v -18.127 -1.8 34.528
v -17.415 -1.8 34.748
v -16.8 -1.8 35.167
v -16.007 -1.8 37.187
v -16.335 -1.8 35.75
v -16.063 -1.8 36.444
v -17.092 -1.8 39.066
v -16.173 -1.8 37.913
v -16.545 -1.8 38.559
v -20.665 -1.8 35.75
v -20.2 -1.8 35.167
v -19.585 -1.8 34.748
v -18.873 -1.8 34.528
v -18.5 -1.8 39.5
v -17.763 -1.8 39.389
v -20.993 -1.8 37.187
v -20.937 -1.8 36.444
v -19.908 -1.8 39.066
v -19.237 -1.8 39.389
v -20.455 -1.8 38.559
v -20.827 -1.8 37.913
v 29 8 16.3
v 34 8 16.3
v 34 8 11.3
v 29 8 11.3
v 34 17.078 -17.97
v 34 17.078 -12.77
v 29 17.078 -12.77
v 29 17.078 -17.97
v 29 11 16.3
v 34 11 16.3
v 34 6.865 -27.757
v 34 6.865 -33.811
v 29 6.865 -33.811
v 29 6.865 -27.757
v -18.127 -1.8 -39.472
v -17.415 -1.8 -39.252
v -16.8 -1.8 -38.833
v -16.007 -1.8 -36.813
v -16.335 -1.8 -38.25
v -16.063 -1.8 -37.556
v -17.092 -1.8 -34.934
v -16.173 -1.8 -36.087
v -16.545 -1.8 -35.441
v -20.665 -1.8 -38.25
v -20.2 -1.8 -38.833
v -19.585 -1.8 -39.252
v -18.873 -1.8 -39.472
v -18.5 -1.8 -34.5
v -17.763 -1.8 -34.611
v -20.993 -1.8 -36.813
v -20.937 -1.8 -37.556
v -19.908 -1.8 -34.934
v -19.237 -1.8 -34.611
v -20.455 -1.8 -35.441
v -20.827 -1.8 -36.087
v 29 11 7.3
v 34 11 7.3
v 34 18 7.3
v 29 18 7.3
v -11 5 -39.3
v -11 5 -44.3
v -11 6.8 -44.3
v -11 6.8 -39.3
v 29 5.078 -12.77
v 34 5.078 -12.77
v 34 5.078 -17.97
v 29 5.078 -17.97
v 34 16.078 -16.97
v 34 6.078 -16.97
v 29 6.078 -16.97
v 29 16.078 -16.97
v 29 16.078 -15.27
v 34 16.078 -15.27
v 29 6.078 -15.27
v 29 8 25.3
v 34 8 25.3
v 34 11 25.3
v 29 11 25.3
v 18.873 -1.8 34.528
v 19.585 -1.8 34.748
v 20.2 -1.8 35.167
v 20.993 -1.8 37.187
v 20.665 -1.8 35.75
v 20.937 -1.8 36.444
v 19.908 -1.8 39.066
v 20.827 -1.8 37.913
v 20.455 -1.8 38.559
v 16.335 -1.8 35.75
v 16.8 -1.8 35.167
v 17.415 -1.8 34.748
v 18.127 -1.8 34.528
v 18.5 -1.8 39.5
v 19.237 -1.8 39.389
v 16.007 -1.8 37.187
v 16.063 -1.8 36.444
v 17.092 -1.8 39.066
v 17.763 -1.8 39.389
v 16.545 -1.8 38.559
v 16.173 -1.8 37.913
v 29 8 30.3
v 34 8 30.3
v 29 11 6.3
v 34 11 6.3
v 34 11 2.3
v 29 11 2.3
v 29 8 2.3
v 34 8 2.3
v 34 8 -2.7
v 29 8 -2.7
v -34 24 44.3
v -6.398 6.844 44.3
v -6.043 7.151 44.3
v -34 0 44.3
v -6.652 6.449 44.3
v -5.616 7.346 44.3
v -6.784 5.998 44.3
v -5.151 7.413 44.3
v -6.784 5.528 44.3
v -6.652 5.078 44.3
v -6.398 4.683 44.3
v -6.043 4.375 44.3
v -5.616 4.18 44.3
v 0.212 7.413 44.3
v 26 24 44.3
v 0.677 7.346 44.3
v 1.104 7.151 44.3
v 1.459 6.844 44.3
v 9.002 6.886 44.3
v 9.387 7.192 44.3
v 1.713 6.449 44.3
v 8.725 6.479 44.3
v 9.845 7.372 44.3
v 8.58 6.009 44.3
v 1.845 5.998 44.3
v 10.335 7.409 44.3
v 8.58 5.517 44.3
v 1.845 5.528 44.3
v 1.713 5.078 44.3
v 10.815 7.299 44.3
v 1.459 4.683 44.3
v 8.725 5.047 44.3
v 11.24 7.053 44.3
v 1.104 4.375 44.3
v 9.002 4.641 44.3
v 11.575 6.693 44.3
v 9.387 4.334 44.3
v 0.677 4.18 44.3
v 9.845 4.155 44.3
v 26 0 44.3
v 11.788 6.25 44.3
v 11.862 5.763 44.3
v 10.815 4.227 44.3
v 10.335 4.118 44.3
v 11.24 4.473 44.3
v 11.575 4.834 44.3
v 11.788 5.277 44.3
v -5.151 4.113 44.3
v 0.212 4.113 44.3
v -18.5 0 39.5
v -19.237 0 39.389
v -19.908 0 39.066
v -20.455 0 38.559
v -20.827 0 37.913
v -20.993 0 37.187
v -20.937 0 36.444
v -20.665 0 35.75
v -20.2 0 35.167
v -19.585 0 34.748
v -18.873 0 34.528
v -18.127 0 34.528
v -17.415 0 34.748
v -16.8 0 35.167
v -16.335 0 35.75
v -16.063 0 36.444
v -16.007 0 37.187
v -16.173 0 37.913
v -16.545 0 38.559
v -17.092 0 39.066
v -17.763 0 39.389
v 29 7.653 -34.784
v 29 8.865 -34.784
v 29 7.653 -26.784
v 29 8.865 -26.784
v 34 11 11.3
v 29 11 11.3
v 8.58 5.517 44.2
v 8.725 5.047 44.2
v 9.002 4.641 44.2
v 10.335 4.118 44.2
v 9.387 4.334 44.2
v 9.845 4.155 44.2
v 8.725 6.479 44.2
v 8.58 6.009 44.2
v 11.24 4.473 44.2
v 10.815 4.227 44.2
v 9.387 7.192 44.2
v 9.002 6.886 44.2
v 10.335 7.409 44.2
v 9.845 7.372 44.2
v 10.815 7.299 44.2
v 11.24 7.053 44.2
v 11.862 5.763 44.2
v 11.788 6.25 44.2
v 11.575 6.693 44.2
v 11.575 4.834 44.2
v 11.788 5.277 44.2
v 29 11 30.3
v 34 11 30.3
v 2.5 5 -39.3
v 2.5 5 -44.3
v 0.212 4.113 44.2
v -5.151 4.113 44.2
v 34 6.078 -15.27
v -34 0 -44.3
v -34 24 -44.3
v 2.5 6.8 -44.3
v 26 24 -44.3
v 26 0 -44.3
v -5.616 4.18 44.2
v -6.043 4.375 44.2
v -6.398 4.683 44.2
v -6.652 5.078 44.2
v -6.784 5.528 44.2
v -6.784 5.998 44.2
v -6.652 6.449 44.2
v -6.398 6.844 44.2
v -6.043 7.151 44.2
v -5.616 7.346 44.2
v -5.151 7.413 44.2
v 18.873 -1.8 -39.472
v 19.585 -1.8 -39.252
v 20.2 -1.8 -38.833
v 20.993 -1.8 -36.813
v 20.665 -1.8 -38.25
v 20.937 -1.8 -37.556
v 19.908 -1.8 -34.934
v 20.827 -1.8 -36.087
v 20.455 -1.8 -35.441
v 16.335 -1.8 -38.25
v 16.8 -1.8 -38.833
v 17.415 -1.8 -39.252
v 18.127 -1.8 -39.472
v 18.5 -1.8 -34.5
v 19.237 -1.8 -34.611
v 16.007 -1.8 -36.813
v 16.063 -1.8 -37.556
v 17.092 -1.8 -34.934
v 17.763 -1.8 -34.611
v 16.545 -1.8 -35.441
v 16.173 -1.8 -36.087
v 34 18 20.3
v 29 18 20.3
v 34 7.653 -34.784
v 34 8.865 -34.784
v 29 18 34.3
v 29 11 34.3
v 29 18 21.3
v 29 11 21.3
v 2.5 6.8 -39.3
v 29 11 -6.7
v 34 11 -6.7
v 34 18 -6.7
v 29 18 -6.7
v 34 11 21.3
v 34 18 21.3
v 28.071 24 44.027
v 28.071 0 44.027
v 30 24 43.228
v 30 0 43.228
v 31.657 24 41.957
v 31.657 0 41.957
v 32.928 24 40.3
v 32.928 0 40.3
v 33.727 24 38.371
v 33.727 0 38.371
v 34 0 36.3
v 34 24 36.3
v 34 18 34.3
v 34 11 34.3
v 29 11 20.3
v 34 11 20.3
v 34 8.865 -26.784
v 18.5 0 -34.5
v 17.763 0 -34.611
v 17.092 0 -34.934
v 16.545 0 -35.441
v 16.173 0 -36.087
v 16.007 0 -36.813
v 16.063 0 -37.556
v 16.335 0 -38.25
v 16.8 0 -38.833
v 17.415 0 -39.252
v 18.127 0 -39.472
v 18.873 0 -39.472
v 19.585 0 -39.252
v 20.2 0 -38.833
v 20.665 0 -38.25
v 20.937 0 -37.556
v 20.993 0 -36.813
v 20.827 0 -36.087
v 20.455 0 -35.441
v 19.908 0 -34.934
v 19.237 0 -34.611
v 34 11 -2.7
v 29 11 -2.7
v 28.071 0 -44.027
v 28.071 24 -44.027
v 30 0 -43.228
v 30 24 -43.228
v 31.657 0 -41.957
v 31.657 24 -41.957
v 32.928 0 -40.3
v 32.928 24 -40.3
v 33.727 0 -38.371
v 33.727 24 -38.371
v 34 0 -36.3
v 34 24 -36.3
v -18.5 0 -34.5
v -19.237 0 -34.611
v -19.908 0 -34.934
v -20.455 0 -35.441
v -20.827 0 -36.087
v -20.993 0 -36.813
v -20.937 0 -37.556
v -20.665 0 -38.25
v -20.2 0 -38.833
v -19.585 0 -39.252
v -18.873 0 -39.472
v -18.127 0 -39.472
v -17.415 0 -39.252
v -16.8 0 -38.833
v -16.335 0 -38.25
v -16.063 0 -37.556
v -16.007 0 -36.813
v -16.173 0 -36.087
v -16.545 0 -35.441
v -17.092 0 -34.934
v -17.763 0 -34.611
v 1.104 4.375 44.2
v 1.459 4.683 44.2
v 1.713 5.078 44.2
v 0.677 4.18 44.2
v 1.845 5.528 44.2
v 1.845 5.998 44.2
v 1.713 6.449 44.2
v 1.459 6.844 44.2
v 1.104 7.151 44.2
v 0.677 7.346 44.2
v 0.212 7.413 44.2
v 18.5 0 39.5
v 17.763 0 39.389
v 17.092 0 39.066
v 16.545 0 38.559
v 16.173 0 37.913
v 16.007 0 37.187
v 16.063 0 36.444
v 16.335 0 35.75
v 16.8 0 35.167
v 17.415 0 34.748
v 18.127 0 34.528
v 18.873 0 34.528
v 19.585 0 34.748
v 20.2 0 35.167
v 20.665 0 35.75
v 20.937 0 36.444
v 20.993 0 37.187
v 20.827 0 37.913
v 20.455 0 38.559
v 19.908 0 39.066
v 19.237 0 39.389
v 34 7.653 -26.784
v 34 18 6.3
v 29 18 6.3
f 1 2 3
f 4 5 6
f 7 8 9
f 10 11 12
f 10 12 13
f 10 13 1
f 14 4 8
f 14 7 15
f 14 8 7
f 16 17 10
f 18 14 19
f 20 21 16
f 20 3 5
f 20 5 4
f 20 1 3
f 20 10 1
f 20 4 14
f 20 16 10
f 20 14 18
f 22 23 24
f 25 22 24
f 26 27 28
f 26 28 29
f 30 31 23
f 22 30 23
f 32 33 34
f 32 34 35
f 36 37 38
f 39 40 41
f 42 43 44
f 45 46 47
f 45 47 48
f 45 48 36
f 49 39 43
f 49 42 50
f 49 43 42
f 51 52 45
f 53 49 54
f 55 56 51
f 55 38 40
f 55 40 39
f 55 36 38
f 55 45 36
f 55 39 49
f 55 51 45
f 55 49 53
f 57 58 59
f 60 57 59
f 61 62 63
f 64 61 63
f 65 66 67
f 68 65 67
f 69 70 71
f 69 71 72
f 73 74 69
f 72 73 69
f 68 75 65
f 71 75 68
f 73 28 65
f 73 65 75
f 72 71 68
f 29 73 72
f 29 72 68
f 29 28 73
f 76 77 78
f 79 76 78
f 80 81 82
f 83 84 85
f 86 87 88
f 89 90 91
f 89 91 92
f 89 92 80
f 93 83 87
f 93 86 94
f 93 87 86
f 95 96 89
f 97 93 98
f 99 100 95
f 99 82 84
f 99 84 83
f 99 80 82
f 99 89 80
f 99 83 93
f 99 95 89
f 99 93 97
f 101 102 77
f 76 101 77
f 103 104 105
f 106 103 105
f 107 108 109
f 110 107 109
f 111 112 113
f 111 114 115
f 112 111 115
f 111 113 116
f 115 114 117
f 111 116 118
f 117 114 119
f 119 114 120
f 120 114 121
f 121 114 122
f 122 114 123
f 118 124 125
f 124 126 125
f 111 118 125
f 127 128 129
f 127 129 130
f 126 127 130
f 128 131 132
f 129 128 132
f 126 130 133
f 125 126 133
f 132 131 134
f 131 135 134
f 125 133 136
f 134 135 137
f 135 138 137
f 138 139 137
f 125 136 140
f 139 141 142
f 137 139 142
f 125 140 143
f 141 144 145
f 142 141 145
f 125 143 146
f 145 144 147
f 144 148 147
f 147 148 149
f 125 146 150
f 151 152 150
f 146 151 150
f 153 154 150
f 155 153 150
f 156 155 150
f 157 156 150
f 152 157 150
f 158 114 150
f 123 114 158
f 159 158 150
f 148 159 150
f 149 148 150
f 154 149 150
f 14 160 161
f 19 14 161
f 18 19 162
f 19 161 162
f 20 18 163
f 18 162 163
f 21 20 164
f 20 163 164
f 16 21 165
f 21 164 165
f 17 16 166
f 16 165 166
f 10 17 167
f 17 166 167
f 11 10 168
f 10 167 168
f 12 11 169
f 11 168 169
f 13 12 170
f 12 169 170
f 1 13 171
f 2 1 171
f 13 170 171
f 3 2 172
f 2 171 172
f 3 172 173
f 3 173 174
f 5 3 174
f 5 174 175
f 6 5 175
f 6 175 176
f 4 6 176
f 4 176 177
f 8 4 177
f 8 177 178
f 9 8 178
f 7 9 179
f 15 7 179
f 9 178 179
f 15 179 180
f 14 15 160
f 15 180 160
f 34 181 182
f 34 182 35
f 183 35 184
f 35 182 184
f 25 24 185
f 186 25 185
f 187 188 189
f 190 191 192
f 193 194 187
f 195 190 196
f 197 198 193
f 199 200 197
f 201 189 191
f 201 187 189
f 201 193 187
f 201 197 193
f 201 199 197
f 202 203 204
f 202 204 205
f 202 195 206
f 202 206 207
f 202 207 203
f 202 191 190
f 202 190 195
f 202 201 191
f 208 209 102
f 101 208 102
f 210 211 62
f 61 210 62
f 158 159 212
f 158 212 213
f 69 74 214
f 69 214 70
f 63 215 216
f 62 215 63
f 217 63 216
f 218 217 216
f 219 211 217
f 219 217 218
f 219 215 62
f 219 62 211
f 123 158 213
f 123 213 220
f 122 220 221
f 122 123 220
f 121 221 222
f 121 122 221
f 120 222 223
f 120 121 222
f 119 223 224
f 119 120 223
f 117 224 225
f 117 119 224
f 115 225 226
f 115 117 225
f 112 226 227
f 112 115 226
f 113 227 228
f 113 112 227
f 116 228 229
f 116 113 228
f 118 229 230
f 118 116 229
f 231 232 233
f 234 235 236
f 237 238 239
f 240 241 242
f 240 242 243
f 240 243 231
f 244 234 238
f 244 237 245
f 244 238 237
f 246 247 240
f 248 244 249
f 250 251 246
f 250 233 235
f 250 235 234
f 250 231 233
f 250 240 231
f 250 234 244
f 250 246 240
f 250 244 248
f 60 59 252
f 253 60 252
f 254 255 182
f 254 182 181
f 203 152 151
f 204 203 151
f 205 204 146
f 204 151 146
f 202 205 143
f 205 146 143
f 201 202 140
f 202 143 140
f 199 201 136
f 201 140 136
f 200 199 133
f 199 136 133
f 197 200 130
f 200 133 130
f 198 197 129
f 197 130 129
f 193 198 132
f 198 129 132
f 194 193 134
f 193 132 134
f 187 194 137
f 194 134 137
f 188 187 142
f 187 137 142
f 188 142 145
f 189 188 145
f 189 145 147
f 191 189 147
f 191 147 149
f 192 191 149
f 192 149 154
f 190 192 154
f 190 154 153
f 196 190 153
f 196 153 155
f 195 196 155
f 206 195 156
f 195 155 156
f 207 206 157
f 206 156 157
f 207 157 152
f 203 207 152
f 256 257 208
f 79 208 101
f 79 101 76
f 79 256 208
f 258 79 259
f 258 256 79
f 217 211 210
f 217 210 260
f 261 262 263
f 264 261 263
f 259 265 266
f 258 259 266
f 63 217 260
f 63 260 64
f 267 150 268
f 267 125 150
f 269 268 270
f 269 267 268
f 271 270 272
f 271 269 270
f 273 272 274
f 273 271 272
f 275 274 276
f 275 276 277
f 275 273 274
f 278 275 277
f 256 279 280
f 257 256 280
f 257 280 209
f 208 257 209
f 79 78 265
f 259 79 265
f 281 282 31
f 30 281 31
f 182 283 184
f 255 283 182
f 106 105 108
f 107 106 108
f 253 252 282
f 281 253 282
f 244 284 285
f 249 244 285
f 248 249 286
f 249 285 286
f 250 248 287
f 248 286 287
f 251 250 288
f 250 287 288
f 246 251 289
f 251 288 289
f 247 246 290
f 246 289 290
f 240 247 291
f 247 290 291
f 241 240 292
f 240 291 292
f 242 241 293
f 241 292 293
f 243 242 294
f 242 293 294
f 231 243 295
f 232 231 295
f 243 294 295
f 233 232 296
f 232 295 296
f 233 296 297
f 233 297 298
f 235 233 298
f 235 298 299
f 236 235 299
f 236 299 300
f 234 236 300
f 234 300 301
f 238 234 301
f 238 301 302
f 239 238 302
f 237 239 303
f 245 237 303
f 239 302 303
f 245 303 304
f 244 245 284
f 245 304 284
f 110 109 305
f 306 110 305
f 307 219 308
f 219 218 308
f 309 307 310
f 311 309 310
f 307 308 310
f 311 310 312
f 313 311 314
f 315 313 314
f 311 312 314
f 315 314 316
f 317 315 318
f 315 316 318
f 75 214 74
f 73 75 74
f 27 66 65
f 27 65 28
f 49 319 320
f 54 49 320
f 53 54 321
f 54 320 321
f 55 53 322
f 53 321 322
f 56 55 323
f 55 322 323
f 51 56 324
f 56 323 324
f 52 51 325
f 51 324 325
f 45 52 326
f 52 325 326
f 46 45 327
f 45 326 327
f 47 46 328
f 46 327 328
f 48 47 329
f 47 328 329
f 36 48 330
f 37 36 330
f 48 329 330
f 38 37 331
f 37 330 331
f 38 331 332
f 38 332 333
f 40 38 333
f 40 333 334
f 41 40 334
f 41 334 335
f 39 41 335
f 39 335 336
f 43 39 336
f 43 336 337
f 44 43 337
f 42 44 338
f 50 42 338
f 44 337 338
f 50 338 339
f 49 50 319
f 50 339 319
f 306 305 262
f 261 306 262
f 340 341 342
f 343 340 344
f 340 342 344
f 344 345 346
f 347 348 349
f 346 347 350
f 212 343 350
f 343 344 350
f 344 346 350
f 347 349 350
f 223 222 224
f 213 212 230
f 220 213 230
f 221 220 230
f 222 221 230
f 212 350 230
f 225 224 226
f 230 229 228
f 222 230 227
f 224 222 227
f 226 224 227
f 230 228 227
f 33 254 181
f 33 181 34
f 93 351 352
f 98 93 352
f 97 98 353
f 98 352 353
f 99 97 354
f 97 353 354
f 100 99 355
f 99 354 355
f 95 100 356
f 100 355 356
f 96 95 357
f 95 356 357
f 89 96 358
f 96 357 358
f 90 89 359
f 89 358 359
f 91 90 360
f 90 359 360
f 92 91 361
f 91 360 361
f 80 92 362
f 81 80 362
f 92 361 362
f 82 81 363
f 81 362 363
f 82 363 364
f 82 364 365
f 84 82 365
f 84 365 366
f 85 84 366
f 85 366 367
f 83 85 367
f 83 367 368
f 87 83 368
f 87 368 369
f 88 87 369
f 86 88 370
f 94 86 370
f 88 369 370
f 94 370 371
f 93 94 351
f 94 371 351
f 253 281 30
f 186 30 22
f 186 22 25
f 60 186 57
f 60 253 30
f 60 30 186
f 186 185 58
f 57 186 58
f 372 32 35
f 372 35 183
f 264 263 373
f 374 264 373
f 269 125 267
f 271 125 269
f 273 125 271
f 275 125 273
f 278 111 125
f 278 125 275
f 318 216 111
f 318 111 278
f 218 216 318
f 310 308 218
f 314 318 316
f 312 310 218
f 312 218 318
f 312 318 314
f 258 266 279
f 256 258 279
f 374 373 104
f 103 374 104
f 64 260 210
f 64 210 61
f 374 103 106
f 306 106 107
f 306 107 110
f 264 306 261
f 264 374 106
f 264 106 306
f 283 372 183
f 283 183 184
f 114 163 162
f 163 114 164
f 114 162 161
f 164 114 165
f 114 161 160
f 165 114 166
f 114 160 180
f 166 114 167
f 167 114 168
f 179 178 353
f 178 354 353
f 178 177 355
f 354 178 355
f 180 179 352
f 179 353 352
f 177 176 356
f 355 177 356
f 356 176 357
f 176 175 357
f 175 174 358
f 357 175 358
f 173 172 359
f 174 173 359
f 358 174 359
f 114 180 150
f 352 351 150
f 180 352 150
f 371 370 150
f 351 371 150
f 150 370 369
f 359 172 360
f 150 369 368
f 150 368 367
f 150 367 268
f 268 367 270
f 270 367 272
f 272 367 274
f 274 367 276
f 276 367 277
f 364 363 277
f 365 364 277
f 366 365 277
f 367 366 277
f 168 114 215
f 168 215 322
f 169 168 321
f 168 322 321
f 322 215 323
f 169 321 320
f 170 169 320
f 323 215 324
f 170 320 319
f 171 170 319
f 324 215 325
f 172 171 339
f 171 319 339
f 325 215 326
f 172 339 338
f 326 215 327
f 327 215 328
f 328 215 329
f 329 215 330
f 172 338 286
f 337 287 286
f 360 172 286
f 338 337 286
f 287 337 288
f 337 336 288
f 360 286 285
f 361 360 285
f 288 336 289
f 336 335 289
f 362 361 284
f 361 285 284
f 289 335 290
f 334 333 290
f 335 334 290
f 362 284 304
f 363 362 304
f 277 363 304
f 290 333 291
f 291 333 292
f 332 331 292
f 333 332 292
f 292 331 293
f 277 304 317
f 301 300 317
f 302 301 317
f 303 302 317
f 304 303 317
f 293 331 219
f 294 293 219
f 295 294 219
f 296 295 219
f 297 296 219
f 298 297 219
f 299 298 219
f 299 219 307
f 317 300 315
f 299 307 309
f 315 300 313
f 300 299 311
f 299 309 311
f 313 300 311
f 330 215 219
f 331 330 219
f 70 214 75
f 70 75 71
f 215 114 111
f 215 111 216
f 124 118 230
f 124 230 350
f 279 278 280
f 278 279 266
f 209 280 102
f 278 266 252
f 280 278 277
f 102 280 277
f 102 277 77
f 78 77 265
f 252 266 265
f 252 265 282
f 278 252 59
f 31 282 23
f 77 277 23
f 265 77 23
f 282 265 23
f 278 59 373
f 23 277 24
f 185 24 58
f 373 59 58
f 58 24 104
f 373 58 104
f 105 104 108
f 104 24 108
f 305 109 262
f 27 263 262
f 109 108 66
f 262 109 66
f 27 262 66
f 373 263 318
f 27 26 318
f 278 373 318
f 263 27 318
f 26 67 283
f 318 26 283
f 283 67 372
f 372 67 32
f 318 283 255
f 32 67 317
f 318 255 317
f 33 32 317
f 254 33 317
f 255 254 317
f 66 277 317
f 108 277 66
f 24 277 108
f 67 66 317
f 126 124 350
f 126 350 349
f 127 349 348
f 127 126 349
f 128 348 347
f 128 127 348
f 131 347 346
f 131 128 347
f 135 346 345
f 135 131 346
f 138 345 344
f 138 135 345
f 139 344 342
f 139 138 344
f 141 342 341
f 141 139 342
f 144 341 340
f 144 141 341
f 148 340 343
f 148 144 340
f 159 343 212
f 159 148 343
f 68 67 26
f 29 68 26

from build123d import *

# Parameters (mm, degrees)
ESQUISSE1_W             = 68
ESQUISSE1_H             = 88.6
BOSS_EXTRU_1_DEPTH      = 24
ESQUISSE2_W             = 5.2
ESQUISSE2_H             = 12
ESQUISSE2_W_2           = 1.7
ESQUISSE2_H_2           = 10
ENL_V_MAT_EXTRU_1_DEPTH = 5
ESQUISSE3_W             = 13.5
ESQUISSE3_H             = 1.8
ENL_V_MAT_EXTRU_2_DEPTH = 5
ESQUISSE4_R             = 1.65
ENL_V_MAT_EXTRU_3_DEPTH = 0.1
ESQUISSE5_R             = 2.5
BOSS_EXTRU_3_DEPTH      = 1.8
CONG_1_R                = 8


with BuildPart() as part:
    # Esquisse1 → Boss.-Extru.1 (new body)
    with BuildSketch(Plane(origin=(0, 0, 0), x_dir=(1, 0, 0), z_dir=(0, 1, 0))):
        Rectangle(ESQUISSE1_W, ESQUISSE1_H)
    extrude(amount=BOSS_EXTRU_1_DEPTH)

    # Esquisse2 → Enlèv. mat.-Extru.1 (cut)
    # profile 1 of 5: a face of its own
    with BuildSketch(Plane(origin=(34, 0, 0), x_dir=(0, 0, -1), z_dir=(1, 0, 0))):
        Polygon((-34.3, 18), (-34.3, 11), (-30.3, 11), (-30.3, 8), (-25.3, 8), (-25.3, 11), (-21.3, 11), (-21.3, 18), align=None)
    # profile 2 of 5: a face of its own
    with BuildSketch(Plane(origin=(34, 0, 0), x_dir=(0, 0, -1), z_dir=(1, 0, 0))):
        Polygon((-7.3, 18), (-20.3, 18), (-20.3, 11), (-16.3, 11), (-16.3, 8), (-11.3, 8), (-11.3, 11), (-7.3, 11), align=None)
    # profile 3 of 5: a face of its own
    with BuildSketch(Plane(origin=(34, 0, 0), x_dir=(0, 0, -1), z_dir=(1, 0, 0))):
        Polygon((6.7, 18), (-6.3, 18), (-6.3, 11), (-2.3, 11), (-2.3, 8), (2.7, 8), (2.7, 11), (6.7, 11), align=None)
    # profile 4 of 5: a face of its own
    with BuildSketch(Plane(origin=(34, 0, 0), x_dir=(0, 0, -1), z_dir=(1, 0, 0))):
        Polygon((26.784034195, 8.864890508), (34.784034195, 8.864890508), (34.784034195, 7.653311673), (33.810896432, 6.864890508), (27.757171958, 6.864890508), (26.784034195, 7.653311673), align=None)
    # profile 5 of 5: a face of its own
    with BuildSketch(Plane(origin=(34, 0, 0), x_dir=(0, 0, -1), z_dir=(1, 0, 0))):
        with Locations((15.369525707, 11.07791291)):
            Rectangle(ESQUISSE2_W, ESQUISSE2_H)
        with Locations((16.119525707, 11.07791291)):
            Rectangle(ESQUISSE2_W_2, ESQUISSE2_H_2, mode=Mode.SUBTRACT)
    extrude(amount=-ENL_V_MAT_EXTRU_1_DEPTH, mode=Mode.SUBTRACT)

    # Esquisse3 → Enlèv. mat.-Extru.2 (cut)
    with BuildSketch(Plane(origin=(0, 0, -44.3), x_dir=(-1, 0, 0), z_dir=(0, 0, -1))):
        with Locations((4.25, 5.9)):
            Rectangle(ESQUISSE3_W, ESQUISSE3_H)
    extrude(amount=-ENL_V_MAT_EXTRU_2_DEPTH, mode=Mode.SUBTRACT)

    # Esquisse4 → Enlèv. mat.-Extru.3 (cut)
    with BuildSketch(Plane.XY.offset(44.3)):
        with Locations((10.211694525, 5.763285302)):
            Circle(ESQUISSE4_R)
        with BuildLine():
            Line((-5.15123343, 7.413285302), (0.211694525, 7.413285302))
            ThreePointArc((0.211694525, 7.413285302), (1.861694525, 5.763285302), (0.211694525, 4.113285302))
            Line((0.211694525, 4.113285302), (-5.15123343, 4.113285302))
            ThreePointArc((-5.15123343, 4.113285302), (-6.80123343, 5.763285302), (-5.15123343, 7.413285302))
        make_face()
    extrude(amount=-ENL_V_MAT_EXTRU_3_DEPTH, mode=Mode.SUBTRACT)

    # Esquisse5 → Boss.-Extru.3 (add)
    with BuildSketch(Plane.XZ):
        with Locations(Location((-18.5, 37, 0), (0, 0, 90))):
            Circle(ESQUISSE5_R)
        with Locations(Location((18.5, 37, 0), (0, 0, 90))):
            Circle(ESQUISSE5_R)
        with Locations(Location((18.5, -37, 0), (0, 0, 90))):
            Circle(ESQUISSE5_R)
        with Locations(Location((-18.5, -37, 0), (0, 0, 90))):
            Circle(ESQUISSE5_R)
    extrude(amount=BOSS_EXTRU_3_DEPTH)

    # Congé1
    cong_1_edges = [part.edges().sort_by_distance(p)[0] for p in [
        (34, 12, -44.3),
        (34, 12, 44.3),
    ]]
    fillet(cong_1_edges, radius=CONG_1_R)


solid = part.part
